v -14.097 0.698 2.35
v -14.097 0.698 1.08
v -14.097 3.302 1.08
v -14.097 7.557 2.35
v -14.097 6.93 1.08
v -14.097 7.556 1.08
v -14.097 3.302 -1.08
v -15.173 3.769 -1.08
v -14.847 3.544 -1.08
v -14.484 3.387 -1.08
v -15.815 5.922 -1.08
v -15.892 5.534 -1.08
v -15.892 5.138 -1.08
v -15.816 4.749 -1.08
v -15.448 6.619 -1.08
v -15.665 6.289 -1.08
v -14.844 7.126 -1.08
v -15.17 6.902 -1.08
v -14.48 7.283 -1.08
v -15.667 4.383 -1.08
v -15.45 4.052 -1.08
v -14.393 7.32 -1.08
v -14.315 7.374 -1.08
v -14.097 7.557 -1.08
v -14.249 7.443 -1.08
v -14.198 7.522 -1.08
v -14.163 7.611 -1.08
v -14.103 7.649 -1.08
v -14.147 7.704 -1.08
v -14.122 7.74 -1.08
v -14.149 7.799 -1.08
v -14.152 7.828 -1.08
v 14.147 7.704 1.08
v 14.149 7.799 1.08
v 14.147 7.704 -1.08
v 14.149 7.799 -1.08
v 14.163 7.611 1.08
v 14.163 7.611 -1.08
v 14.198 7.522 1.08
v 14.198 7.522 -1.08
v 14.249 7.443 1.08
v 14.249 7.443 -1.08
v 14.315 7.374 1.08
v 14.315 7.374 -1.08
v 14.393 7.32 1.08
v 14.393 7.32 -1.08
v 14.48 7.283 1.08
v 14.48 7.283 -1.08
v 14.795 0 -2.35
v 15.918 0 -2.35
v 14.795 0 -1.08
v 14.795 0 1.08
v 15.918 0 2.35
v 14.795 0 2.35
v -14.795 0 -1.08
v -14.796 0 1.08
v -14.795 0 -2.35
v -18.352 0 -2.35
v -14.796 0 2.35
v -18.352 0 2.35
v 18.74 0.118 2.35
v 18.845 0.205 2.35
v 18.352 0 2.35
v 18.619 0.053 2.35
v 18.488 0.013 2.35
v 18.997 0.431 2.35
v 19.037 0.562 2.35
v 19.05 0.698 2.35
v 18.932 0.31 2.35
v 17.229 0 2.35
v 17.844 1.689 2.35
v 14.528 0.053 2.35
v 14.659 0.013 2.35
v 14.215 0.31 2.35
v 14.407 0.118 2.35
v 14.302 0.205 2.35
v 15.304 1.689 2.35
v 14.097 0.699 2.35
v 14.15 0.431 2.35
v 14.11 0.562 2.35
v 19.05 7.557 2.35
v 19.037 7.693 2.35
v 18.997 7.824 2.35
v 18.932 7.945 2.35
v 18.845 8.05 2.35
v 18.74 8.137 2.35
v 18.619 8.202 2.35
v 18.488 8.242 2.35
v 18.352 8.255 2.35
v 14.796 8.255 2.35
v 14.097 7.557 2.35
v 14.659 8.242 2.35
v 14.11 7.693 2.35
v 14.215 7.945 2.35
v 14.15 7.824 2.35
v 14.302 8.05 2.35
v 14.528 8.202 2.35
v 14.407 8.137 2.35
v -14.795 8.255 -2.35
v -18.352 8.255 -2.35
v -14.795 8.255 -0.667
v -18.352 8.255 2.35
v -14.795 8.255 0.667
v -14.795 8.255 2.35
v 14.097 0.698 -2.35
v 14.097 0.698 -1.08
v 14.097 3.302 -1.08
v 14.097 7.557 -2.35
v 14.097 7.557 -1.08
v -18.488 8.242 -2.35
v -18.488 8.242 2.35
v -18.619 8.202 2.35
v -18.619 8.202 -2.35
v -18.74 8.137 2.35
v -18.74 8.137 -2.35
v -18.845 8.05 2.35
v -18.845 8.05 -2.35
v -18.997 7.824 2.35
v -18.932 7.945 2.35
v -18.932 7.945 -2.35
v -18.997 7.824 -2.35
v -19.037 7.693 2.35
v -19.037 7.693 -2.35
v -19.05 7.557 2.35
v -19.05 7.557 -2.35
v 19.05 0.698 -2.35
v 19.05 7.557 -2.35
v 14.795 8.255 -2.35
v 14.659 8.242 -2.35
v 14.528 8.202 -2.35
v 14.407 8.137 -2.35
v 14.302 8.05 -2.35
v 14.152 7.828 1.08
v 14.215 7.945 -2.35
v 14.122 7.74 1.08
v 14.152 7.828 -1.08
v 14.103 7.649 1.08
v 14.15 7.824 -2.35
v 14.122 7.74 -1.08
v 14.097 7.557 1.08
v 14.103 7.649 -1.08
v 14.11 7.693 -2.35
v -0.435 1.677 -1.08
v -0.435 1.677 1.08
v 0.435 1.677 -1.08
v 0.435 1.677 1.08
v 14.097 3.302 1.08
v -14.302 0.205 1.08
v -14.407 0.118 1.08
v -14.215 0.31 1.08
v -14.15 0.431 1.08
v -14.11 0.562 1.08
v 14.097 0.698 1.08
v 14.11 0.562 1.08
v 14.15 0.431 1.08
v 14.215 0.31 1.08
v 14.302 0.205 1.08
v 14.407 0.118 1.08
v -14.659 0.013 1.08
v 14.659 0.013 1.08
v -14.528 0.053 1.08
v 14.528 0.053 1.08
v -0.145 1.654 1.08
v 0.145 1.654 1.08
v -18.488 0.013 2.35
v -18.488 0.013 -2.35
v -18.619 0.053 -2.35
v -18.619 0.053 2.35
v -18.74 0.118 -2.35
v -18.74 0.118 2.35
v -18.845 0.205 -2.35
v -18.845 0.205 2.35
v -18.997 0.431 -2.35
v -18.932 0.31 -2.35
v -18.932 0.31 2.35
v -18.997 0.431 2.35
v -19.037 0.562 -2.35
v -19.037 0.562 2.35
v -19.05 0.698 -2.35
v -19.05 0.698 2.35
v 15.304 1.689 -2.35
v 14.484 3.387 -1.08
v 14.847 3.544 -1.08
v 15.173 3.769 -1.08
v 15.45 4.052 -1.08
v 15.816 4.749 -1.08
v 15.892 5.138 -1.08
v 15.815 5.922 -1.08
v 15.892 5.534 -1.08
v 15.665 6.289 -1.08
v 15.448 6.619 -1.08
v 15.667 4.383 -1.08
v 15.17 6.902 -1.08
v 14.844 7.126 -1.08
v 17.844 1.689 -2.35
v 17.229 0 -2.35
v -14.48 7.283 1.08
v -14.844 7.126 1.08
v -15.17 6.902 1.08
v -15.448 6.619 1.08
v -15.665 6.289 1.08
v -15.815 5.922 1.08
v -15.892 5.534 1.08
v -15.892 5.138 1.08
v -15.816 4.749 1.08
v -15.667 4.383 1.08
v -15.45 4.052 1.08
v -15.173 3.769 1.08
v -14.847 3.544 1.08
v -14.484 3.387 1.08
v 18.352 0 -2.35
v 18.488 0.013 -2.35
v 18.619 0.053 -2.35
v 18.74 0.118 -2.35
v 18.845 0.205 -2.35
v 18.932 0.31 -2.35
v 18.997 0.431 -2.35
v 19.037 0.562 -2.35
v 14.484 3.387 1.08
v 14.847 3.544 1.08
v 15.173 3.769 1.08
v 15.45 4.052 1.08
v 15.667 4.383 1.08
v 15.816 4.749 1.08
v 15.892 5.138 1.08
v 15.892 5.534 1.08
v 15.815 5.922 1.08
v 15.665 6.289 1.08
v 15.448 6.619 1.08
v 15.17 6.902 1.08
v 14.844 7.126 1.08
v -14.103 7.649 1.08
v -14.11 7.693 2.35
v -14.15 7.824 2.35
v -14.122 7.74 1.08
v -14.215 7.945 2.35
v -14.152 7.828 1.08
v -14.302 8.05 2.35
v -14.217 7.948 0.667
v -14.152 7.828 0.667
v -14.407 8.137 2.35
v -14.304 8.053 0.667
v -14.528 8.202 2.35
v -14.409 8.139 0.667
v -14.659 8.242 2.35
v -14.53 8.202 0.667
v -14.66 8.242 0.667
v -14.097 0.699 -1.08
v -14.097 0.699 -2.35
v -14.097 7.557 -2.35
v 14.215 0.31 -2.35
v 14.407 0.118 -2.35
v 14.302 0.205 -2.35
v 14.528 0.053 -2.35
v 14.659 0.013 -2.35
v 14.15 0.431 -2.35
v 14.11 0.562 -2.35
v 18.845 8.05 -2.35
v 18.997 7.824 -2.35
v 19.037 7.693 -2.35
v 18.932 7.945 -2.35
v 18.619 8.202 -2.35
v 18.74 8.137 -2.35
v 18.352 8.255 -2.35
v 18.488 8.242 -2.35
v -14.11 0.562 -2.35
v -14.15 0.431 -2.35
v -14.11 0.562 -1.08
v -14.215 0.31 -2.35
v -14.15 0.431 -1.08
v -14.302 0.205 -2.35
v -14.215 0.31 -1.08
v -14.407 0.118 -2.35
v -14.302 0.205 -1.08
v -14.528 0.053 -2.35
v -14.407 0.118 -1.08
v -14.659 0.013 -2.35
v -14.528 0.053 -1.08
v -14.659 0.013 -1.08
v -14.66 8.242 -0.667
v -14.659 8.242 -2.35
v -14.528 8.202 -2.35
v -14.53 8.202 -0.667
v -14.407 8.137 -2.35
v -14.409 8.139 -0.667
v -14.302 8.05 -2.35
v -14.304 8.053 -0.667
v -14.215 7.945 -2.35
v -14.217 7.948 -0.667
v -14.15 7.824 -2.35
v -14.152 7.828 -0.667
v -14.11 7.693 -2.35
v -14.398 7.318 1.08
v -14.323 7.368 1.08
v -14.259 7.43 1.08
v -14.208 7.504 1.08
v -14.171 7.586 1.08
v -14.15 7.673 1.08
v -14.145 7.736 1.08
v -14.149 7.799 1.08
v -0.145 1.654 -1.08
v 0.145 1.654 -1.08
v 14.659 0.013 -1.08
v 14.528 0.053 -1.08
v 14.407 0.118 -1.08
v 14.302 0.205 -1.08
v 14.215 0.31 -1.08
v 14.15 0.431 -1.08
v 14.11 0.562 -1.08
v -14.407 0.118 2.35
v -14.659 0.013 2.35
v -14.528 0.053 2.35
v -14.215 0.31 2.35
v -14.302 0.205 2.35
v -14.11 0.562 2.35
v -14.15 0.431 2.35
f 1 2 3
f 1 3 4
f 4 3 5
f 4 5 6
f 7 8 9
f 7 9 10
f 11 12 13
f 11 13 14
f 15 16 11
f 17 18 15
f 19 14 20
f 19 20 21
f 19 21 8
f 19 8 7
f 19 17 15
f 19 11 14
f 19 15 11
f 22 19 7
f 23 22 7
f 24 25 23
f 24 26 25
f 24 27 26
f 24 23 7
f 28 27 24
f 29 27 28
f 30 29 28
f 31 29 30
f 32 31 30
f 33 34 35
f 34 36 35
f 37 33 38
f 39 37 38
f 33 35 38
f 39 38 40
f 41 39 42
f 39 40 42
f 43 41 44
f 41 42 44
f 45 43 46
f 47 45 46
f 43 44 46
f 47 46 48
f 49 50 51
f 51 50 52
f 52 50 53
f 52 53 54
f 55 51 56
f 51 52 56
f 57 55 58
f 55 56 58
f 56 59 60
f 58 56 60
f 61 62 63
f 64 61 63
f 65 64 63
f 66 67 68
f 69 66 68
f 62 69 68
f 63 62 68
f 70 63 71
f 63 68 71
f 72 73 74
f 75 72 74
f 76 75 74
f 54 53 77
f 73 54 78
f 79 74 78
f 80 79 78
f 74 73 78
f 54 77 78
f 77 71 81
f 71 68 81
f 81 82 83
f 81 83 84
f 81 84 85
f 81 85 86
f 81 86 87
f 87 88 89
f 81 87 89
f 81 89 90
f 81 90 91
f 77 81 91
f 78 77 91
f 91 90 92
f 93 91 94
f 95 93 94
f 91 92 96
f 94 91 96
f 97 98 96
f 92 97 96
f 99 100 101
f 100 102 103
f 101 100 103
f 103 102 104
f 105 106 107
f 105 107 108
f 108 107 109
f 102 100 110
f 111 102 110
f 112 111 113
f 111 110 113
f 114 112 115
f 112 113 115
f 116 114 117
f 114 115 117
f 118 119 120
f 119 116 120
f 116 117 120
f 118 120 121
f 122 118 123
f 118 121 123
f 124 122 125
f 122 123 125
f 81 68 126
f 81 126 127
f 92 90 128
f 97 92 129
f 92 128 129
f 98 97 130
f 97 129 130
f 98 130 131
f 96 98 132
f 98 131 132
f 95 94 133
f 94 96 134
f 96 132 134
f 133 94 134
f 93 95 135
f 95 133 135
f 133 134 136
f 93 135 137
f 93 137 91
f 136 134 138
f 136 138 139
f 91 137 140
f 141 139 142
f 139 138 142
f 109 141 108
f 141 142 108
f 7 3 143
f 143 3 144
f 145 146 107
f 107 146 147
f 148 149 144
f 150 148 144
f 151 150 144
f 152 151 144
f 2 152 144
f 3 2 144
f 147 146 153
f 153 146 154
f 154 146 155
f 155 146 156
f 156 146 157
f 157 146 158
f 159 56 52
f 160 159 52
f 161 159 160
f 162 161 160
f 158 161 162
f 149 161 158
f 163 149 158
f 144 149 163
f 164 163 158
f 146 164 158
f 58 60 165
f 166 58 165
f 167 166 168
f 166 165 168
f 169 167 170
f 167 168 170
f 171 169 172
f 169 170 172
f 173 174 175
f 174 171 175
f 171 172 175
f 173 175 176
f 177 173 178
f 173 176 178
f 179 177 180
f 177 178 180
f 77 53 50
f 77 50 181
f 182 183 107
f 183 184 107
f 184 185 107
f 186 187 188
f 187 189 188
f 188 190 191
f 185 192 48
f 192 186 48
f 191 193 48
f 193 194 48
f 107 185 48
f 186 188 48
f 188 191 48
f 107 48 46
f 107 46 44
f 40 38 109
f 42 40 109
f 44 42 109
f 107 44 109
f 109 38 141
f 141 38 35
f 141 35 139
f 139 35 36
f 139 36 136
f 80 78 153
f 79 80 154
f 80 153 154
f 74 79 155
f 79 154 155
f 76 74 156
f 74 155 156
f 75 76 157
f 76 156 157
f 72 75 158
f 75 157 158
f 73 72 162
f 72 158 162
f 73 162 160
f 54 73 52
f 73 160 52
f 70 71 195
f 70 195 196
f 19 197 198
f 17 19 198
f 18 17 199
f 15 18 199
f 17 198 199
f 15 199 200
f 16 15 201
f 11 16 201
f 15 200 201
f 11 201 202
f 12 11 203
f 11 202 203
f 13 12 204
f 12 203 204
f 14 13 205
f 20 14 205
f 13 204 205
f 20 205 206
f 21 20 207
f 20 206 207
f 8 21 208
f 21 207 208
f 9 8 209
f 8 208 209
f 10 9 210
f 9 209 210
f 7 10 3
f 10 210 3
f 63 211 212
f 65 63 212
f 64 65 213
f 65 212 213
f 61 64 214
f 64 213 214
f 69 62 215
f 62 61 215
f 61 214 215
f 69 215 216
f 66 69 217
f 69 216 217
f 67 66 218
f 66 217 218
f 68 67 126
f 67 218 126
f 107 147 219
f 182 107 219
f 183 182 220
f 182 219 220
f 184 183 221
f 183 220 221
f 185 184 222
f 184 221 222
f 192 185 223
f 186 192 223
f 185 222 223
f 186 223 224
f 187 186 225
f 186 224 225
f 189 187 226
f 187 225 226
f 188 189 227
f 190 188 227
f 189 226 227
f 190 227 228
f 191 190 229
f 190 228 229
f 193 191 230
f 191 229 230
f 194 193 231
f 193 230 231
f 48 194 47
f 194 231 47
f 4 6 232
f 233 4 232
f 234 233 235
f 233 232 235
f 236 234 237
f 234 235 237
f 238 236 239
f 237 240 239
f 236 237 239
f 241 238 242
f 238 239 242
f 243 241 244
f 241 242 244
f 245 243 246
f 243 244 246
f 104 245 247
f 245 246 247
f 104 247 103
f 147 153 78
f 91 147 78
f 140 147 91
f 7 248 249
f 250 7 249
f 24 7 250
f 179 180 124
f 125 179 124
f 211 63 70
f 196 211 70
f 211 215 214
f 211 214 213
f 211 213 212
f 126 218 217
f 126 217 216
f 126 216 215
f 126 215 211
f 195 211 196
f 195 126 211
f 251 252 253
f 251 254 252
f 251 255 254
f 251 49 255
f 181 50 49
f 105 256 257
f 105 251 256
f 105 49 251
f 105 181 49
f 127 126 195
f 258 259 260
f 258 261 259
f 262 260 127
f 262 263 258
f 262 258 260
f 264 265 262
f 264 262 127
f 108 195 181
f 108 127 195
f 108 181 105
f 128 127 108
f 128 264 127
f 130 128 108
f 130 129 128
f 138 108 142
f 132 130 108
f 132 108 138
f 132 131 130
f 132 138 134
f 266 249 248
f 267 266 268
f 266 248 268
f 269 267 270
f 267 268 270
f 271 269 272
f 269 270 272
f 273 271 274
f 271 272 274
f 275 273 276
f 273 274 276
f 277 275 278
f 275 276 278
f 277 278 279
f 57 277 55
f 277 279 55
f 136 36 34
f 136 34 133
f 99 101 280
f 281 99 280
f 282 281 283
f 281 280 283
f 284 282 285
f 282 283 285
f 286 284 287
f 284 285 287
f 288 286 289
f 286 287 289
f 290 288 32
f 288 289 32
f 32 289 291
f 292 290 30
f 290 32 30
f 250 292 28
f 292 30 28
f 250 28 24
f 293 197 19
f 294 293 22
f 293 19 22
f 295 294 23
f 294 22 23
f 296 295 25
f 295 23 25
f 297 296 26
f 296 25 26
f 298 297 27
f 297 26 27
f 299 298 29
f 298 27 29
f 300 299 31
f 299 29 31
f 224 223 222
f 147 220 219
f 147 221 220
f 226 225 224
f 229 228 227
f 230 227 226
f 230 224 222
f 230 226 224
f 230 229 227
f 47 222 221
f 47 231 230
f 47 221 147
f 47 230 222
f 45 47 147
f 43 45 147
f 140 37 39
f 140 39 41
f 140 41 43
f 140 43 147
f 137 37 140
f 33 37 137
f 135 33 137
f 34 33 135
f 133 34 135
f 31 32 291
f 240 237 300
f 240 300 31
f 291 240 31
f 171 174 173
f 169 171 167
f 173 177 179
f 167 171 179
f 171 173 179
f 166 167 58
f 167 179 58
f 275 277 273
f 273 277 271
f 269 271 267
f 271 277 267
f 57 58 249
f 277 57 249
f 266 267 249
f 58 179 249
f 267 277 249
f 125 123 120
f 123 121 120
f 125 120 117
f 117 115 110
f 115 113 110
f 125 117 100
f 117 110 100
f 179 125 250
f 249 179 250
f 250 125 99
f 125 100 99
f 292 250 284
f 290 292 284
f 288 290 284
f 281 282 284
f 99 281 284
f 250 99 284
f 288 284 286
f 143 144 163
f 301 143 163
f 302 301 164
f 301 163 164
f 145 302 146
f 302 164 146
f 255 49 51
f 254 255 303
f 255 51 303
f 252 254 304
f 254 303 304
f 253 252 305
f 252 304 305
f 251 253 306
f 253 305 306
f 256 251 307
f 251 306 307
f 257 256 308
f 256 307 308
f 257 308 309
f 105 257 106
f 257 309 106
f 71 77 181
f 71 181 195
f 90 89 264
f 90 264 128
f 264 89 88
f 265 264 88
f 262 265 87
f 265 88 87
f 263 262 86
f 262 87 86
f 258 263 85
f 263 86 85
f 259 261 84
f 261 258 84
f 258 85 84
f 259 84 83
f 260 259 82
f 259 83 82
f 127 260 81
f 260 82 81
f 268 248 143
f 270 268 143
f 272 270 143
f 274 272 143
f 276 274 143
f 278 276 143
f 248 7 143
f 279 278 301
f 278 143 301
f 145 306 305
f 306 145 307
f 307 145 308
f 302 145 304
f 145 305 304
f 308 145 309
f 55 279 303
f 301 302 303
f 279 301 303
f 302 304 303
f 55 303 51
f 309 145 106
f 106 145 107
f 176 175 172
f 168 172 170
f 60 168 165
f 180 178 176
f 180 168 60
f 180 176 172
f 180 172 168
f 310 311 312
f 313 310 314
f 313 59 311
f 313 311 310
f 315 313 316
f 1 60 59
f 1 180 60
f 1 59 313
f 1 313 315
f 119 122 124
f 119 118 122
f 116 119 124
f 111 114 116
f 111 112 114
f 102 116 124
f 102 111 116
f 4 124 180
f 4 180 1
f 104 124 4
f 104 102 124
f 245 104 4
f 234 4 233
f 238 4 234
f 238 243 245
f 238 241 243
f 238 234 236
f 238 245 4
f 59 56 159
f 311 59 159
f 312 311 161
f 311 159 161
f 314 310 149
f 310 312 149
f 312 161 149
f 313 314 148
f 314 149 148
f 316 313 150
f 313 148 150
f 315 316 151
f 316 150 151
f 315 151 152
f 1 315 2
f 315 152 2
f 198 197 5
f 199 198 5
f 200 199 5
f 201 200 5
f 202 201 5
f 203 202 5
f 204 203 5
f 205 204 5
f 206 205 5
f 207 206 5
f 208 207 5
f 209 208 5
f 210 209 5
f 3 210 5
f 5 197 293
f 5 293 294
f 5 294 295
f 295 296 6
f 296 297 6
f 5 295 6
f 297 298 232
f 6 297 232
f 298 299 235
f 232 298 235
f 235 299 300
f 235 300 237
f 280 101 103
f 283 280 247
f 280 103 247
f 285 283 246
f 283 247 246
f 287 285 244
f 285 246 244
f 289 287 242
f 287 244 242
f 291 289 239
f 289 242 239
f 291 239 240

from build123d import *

# Parameters (mm, degrees)
SKETCH1_W               = 38.1
SKETCH1_H               = 2.159
BOSS_EXTRUDE1_DEPTH     = 8.255
CUT_EXTRUDE1_DEPTH      = 12.7
SKETCH3_W               = 4.953
SKETCH3_H               = 8.255
BOSS_EXTRUDE2_DEPTH     = 1.27
FILLET5_R               = 0.4826
MIRROR2_COPY_1_SKETCH_W = 4.953
MIRROR2_COPY_1_SKETCH_H = 8.255
MIRROR2_COPY_1_DEPTH    = 1.27
CUT_EXTRUDE2_DEPTH      = 22.286806422
FILLET6_R               = 0.6985


with BuildPart() as part:
    # Sketch1 → Boss-Extrude1 (new body)
    with BuildSketch(Plane(origin=(0, 0, 0), x_dir=(1, 0, 0), z_dir=(0, 1, 0))):
        Rectangle(SKETCH1_W, SKETCH1_H)
    extrude(amount=BOSS_EXTRUDE1_DEPTH)

    # Sketch2 → Cut-Extrude1 (cut)
    with BuildSketch(Plane.XY.offset(1.0795)):
        with BuildLine():
            ThreePointArc((-0.435059279, 1.676786249), (0, 1.651), (0.435059279, 1.676786249))
            Line((0.435059279, 1.676786249), (14.097, 3.302))
            ThreePointArc((14.097, 3.302), (15.901602081, 5.334), (14.097, 7.366))
            Line((14.097, 7.366), (14.202754743, 8.255))
            Line((14.202754743, 8.255), (-14.202754743, 8.255))
            Line((-14.202754743, 8.255), (-14.097, 7.366))
            ThreePointArc((-14.097, 7.366), (-15.901602081, 5.334), (-14.097, 3.302))
            Line((-14.097, 3.302), (-0.435059279, 1.676786249))
        make_face()
    extrude(amount=-CUT_EXTRUDE1_DEPTH, mode=Mode.SUBTRACT)

    # Sketch3 → Boss-Extrude2 (add)
    with BuildSketch(Plane.XY.offset(1.0795)):
        with Locations((-16.5735, 4.1275)):
            Rectangle(SKETCH3_W, SKETCH3_H)
    boss_extrude2 = extrude(amount=BOSS_EXTRUDE2_DEPTH)

    # Fillet5
    fillet5_edges = [part.edges().sort_by_distance(p)[0] for p in [
        (14.202754743, 8.255, 0),
        (-14.202754743, 8.255, 0),
        (14.097, 7.366, 0),
        (-14.097, 7.366, 0),
    ]]
    fillet(fillet5_edges, radius=FILLET5_R)

    # Mirror1: Boss-Extrude2 across plane
    add(boss_extrude2.mirror(Plane(origin=(0, 0, 0), x_dir=(0, 0, 1), z_dir=(1, 0, 0))))

    # Mirror2: Boss-Extrude2 across plane
    add(boss_extrude2.mirror(Plane.XY))

    # Mirror2 copy 1 sketch → Mirror2 copy 1 (add)
    with BuildSketch(Plane(origin=(0, 0, -1.0795), x_dir=(-1, 0, 0), z_dir=(0, 0, -1))):
        with Locations((-16.5735, 4.1275)):
            Rectangle(MIRROR2_COPY_1_SKETCH_W, MIRROR2_COPY_1_SKETCH_H)
    extrude(amount=MIRROR2_COPY_1_DEPTH)

    # Sketch4 → Cut-Extrude2 (cut, through all)
    with BuildSketch(Plane.XY.offset(2.3495)):
        Polygon((15.3035, 1.6891), (17.8435, 1.6891), (17.228717877, 0), (15.918282123, 0), align=None)
    extrude(amount=-CUT_EXTRUDE2_DEPTH, mode=Mode.SUBTRACT)

    # Fillet6
    # the kernel refuses this fillet: 0.6985 mm, written as the material it takes off along each edge
    with BuildSketch(Plane(origin=(-19.05, 8.255, -4.09575), x_dir=(1, 0, 0), z_dir=(0, 0, 1)), Plane(origin=(19.05, 8.255, 4.09575), x_dir=(-1, 0, 0), z_dir=(0, 0, -1)), Plane(origin=(-19.05, 0, 4.09575), x_dir=(1, 0, 0), z_dir=(0, 0, -1))) as fillet6_piece_1:
        with BuildLine():
            CenterArc((FILLET6_R, -FILLET6_R), FILLET6_R, 90, 90)
            Line((0, -FILLET6_R), (0, 0))
            Line((0, 0), (FILLET6_R, 0))
        make_face()
    extrude(amount=8.1915, mode=Mode.SUBTRACT)
    with BuildSketch(Plane(origin=(-14.097, 8.255, 0.66675), x_dir=(-1, 0, 0), z_dir=(0, 0, -1)), Plane(origin=(-14.097, 8.255, -0.66675), x_dir=(0, -1, 0), z_dir=(0, 0, 1))) as fillet6_piece_2:
        with BuildLine():
            CenterArc((FILLET6_R, -FILLET6_R), FILLET6_R, 90, 90)
            Line((0, -FILLET6_R), (0, 0))
            Line((0, 0), (FILLET6_R, 0))
        make_face()
    extrude(amount=4.7625, mode=Mode.SUBTRACT)
    with BuildSketch(Plane(origin=(-14.097, 0, -1.0795), x_dir=(-1, 0, 0), z_dir=(0, 0, -1)), Plane(origin=(-14.097, 0, 1.0795), x_dir=(0, 1, 0), z_dir=(0, 0, 1))) as fillet6_piece_3:
        with BuildLine():
            CenterArc((FILLET6_R, FILLET6_R), FILLET6_R, 180, 90)
            Line((0, FILLET6_R), (0, 0))
            Line((0, 0), (FILLET6_R, 0))
        make_face()
    extrude(amount=3.01625, mode=Mode.SUBTRACT)
    with BuildSketch(Plane(origin=(14.097, 0, -1.0795), x_dir=(1, 0, 0), z_dir=(0, 0, -1)), Plane(origin=(14.097, 0, 1.0795), x_dir=(0, 1, 0), z_dir=(0, 0, 1))) as fillet6_piece_4:
        with BuildLine():
            CenterArc((FILLET6_R, -FILLET6_R), FILLET6_R, 90, 90)
            Line((0, -FILLET6_R), (0, 0))
            Line((0, 0), (FILLET6_R, 0))
        make_face()
    extrude(amount=3.01625, mode=Mode.SUBTRACT)
    with BuildSketch(Plane(origin=(14.097, 8.255, 0.66675), x_dir=(1, 0, 0), z_dir=(0, 0, -1)), Plane(origin=(14.097, 8.255, -0.66675), x_dir=(0, -1, 0), z_dir=(0, 0, 1))) as fillet6_piece_5:
        with BuildLine():
            CenterArc((FILLET6_R, FILLET6_R), FILLET6_R, 180, 90)
            Line((0, FILLET6_R), (0, 0))
            Line((0, 0), (FILLET6_R, 0))
        make_face()
    extrude(amount=4.7625, mode=Mode.SUBTRACT)
    with BuildSketch(Plane(origin=(19.05, 0, -4.09575), x_dir=(0, 1, 0), z_dir=(0, 0, 1))) as fillet6_piece_6:
        with BuildLine():
            CenterArc((FILLET6_R, FILLET6_R), FILLET6_R, 180, 90)
            Line((0, FILLET6_R), (0, 0))
            Line((0, 0), (FILLET6_R, 0))
        make_face()
    extrude(amount=8.1915, mode=Mode.SUBTRACT)


solid = part.part
